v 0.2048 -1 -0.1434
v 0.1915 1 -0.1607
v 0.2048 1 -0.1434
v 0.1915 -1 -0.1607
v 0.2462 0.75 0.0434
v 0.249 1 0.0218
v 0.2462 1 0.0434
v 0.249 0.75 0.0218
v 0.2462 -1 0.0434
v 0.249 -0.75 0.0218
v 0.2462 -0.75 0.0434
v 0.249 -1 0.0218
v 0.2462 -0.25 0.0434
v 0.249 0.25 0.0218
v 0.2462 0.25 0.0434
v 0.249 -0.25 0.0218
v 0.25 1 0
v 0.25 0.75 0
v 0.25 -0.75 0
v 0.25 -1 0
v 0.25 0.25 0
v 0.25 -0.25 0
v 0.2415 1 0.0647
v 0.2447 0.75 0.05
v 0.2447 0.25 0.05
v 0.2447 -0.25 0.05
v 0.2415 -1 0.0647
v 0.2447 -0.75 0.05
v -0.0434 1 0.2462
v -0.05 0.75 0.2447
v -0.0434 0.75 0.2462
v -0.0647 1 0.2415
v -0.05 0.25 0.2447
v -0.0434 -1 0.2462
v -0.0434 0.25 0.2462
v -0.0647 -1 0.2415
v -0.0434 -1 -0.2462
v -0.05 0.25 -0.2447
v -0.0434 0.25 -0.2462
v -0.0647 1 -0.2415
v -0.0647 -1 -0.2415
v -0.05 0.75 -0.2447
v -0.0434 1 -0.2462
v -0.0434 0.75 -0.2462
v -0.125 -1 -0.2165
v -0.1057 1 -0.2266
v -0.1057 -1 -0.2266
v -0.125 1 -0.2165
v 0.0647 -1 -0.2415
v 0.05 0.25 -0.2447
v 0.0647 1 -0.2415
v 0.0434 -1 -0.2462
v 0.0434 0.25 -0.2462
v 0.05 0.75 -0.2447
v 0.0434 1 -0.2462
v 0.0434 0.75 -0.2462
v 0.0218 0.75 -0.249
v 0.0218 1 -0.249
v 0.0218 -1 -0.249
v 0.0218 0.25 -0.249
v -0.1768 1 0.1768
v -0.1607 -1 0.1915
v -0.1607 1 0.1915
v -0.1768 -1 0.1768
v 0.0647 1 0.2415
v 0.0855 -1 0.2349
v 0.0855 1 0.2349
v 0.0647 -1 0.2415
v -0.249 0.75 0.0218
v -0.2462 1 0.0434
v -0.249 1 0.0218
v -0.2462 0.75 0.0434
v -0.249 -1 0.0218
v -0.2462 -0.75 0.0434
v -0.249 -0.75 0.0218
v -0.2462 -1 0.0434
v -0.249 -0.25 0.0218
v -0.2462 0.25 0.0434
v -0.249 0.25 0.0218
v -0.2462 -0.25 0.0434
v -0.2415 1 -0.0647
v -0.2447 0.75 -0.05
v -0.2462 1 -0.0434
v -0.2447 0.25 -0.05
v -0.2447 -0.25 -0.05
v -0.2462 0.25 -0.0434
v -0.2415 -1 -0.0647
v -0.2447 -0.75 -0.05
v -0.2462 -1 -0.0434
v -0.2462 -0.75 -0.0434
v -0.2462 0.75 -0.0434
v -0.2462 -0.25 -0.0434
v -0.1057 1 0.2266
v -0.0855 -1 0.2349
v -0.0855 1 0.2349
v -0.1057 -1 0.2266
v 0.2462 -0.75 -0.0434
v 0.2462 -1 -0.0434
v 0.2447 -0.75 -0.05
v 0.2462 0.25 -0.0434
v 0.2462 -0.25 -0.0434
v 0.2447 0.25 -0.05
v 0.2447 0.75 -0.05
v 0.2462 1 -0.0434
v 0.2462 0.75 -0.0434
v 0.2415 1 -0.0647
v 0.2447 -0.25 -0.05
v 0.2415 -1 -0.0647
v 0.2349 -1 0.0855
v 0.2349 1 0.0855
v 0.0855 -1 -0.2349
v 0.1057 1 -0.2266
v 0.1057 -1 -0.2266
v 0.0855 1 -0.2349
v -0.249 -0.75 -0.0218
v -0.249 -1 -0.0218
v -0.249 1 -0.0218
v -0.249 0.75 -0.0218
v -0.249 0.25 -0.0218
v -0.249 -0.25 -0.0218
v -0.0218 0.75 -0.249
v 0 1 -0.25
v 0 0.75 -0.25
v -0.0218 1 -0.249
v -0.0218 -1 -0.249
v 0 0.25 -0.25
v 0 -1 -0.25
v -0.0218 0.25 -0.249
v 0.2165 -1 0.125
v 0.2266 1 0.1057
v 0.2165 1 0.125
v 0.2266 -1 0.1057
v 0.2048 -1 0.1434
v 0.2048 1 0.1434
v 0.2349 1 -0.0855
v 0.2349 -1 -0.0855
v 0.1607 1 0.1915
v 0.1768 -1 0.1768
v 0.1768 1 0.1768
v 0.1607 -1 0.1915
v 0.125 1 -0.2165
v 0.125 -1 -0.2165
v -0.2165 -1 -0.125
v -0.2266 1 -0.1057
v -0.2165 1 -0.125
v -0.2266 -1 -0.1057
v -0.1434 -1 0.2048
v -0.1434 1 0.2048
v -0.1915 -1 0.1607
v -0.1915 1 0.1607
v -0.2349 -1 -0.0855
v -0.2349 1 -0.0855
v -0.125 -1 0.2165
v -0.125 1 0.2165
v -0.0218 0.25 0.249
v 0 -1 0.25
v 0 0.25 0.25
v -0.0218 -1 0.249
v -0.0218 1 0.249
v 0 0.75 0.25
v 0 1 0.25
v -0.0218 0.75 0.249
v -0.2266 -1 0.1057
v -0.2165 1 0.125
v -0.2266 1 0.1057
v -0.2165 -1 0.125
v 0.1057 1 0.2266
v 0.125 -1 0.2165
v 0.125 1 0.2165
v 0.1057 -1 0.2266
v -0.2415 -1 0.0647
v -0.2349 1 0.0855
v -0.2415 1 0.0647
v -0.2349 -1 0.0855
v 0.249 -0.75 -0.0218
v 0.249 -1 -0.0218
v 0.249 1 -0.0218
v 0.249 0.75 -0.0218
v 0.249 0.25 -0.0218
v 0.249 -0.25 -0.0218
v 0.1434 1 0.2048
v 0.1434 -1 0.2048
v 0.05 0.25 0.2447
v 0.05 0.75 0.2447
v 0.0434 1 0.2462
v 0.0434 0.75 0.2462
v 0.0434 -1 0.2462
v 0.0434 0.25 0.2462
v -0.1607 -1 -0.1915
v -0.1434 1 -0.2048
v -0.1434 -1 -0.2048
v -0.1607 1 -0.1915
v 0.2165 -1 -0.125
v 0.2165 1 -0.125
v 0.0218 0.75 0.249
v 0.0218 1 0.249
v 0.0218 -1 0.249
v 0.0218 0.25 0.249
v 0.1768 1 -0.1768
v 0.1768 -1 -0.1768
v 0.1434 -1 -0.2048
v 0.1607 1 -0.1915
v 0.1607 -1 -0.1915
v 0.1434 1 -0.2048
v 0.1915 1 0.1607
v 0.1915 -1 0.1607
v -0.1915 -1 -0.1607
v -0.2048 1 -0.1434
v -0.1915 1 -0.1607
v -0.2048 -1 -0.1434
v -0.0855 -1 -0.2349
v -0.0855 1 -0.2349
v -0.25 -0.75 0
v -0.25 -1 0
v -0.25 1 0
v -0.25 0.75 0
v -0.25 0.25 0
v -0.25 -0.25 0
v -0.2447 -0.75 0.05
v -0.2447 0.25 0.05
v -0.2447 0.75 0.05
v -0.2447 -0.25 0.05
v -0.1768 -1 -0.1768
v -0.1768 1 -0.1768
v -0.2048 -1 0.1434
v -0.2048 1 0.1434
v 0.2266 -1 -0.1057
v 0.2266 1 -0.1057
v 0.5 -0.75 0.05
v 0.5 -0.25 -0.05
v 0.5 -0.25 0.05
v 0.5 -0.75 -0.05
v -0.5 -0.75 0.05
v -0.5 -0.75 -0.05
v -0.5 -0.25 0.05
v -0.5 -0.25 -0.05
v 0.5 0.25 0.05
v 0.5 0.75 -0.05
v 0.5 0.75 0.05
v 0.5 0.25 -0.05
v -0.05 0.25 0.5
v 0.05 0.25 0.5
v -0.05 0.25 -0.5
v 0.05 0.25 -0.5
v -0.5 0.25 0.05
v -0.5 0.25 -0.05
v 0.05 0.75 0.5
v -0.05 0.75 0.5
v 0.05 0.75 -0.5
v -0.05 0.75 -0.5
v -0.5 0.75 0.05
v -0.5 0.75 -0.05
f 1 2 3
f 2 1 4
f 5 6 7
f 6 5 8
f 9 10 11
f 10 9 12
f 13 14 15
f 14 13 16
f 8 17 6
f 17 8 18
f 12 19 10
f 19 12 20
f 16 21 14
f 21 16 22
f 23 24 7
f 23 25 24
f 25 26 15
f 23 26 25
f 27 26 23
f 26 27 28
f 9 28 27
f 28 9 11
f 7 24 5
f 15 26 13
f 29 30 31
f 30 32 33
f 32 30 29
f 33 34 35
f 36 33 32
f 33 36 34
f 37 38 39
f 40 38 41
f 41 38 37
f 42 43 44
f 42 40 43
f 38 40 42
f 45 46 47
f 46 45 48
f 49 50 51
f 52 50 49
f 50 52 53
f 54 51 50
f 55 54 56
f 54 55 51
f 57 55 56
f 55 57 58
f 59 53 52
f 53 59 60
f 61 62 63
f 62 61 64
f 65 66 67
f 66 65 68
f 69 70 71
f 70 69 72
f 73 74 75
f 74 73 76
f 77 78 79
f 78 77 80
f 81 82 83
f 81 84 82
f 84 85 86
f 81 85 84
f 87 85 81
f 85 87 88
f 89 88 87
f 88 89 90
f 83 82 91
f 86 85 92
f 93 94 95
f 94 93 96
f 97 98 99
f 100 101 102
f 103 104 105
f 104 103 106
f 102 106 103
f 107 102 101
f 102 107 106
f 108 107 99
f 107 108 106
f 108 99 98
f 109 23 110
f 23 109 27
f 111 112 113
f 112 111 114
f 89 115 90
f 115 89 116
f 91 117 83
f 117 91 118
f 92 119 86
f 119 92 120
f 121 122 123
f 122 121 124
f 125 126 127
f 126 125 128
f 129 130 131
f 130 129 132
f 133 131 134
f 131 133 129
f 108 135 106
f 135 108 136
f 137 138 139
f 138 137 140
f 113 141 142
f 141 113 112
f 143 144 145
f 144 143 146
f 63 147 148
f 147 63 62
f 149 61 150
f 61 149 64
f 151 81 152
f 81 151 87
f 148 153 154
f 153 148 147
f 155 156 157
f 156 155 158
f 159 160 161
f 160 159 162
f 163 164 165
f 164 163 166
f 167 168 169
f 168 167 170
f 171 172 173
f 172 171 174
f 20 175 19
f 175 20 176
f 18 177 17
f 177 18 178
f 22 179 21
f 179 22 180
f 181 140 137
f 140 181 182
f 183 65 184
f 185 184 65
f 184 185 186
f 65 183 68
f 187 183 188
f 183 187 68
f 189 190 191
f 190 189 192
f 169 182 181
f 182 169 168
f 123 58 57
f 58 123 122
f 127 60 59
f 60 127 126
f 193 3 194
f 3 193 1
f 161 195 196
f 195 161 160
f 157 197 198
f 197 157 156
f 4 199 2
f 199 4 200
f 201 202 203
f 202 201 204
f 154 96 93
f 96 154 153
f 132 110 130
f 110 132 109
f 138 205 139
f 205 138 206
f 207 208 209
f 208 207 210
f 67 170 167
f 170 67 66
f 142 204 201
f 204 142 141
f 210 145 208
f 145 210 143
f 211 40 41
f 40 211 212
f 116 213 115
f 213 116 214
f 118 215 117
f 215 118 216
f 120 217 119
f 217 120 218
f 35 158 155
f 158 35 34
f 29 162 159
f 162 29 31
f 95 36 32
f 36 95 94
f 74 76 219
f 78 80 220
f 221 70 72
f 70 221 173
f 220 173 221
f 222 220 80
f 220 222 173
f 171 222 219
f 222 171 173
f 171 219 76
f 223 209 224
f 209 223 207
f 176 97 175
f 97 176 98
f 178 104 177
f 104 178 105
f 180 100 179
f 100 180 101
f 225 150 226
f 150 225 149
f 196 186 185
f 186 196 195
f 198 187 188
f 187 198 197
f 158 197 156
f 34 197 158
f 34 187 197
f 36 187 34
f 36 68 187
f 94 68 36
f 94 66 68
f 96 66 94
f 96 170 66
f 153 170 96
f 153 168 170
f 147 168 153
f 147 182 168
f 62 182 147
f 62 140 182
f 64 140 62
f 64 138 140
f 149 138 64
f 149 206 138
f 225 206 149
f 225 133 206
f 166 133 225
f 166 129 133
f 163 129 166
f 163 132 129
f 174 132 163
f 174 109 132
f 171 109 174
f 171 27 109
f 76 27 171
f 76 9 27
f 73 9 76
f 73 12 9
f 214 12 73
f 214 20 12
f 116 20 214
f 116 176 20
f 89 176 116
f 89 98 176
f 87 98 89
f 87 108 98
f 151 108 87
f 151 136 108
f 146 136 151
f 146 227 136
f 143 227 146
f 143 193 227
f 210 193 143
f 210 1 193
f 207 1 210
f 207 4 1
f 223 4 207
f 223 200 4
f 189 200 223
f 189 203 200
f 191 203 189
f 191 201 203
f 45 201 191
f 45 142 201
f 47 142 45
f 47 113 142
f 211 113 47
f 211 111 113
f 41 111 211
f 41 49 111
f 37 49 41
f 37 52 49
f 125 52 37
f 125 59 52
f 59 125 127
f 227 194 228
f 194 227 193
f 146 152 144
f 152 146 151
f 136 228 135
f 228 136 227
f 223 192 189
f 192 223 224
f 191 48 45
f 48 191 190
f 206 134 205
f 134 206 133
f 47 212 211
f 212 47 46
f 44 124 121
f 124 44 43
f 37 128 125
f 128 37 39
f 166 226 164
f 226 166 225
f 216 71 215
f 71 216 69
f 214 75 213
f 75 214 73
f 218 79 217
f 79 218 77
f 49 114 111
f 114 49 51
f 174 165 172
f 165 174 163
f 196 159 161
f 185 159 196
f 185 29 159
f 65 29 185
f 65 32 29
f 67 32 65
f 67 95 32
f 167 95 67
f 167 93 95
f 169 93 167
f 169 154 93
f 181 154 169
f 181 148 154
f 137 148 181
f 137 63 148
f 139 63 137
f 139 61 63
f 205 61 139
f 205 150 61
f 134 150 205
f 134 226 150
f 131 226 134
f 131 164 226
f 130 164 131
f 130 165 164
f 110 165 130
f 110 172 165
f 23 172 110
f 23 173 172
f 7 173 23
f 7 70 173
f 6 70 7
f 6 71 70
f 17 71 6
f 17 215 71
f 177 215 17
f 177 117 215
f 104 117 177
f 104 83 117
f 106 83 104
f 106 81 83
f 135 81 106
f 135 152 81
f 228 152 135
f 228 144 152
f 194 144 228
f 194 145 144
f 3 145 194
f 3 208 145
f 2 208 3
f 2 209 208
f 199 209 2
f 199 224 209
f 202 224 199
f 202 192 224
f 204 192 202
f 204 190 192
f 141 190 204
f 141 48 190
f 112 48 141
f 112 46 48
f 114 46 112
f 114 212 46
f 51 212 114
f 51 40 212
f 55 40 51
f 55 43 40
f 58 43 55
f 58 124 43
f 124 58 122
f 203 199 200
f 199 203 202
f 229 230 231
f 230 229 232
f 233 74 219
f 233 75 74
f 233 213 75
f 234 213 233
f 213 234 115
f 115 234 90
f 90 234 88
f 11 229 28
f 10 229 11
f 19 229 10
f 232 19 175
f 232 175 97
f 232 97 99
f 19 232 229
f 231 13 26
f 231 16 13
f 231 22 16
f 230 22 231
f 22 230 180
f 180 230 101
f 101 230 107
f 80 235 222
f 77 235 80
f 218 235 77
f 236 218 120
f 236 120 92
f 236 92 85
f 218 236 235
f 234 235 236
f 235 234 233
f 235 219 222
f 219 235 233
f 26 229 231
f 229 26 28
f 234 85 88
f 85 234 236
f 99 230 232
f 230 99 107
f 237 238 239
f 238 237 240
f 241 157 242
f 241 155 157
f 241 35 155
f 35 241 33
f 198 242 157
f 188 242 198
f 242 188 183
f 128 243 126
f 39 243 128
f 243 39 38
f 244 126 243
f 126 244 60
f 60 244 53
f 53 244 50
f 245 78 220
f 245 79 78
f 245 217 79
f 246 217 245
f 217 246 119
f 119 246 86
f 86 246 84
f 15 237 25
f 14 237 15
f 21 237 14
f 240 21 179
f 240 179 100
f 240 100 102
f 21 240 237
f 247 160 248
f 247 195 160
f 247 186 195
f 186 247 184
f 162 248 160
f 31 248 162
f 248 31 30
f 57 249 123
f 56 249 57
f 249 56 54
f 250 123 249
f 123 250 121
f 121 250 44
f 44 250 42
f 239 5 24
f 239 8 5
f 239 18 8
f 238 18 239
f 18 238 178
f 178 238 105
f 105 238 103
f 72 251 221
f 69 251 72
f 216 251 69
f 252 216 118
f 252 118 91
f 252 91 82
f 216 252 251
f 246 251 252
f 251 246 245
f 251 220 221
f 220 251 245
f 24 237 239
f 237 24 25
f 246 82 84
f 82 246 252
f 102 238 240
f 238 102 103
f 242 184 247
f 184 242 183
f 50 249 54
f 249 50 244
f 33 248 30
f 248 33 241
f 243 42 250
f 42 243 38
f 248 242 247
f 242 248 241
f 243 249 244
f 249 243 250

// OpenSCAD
// file: lib.scad
function x(v) = v[0];
function y(v) = v[1];
function z(v) = v[2];
function add(v1,v2) = [ for (i = [ 0 : len(v1)-1 ]) v1[i] + v2[i] ];
function xv(d) = [d,0,0];
function yv(d) = [0,d,0];
function zv(d) = [0,0,d];

module box(v) { cube(size=v, center=true); }
module cyl(r1,r2,h) { cylinder(r1=r1, r2=r2, h=h, center=true); }

function grow(n,v) = [x(v)+n*2, y(v)+n*2, z(v)+n*2];

module rbox(v, radius=1) {
	cx = x(v)/2-radius;
	cy = y(v)/2-radius;
	cz = z(v)/2-radius;

	hull() {
		translate([cx,cy,cz]) sphere(r=radius);
		translate([cx,cy,-cz]) sphere(r=radius);
		translate([cx,-cy,cz]) sphere(r=radius);
		translate([cx,-cy,-cz]) sphere(r=radius);
		translate([-cx,cy,cz]) sphere(r=radius);
		translate([-cx,cy,-cz]) sphere(r=radius);
		translate([-cx,-cy,cz]) sphere(r=radius);
		translate([-cx,-cy,-cz]) sphere(r=radius);
	}
}

module fillet(r=1) {
  minkowski() {
    difference() {
      children();
      minkowski() {
        difference() {
          minkowski() {
            children();
            sphere(r=r);
          }
          children();
        }
        sphere(r=r);
      }
    }
    sphere(r=r);
  }
}
// main file
use <lib.scad>

module chassis() {
	rotate([90,0,0]) union() {
		cyl(0.25, 0.25, 2.0);
		translate([0,0,0.5]) box([1.0, 0.1, 0.5]);
		translate([0,0,-0.5]) box([1.0, 0.1, 0.5]);
		translate([0,0,-0.5]) box([0.1, 1.0, 0.5]);
	};
}

chassis($fn=72);
